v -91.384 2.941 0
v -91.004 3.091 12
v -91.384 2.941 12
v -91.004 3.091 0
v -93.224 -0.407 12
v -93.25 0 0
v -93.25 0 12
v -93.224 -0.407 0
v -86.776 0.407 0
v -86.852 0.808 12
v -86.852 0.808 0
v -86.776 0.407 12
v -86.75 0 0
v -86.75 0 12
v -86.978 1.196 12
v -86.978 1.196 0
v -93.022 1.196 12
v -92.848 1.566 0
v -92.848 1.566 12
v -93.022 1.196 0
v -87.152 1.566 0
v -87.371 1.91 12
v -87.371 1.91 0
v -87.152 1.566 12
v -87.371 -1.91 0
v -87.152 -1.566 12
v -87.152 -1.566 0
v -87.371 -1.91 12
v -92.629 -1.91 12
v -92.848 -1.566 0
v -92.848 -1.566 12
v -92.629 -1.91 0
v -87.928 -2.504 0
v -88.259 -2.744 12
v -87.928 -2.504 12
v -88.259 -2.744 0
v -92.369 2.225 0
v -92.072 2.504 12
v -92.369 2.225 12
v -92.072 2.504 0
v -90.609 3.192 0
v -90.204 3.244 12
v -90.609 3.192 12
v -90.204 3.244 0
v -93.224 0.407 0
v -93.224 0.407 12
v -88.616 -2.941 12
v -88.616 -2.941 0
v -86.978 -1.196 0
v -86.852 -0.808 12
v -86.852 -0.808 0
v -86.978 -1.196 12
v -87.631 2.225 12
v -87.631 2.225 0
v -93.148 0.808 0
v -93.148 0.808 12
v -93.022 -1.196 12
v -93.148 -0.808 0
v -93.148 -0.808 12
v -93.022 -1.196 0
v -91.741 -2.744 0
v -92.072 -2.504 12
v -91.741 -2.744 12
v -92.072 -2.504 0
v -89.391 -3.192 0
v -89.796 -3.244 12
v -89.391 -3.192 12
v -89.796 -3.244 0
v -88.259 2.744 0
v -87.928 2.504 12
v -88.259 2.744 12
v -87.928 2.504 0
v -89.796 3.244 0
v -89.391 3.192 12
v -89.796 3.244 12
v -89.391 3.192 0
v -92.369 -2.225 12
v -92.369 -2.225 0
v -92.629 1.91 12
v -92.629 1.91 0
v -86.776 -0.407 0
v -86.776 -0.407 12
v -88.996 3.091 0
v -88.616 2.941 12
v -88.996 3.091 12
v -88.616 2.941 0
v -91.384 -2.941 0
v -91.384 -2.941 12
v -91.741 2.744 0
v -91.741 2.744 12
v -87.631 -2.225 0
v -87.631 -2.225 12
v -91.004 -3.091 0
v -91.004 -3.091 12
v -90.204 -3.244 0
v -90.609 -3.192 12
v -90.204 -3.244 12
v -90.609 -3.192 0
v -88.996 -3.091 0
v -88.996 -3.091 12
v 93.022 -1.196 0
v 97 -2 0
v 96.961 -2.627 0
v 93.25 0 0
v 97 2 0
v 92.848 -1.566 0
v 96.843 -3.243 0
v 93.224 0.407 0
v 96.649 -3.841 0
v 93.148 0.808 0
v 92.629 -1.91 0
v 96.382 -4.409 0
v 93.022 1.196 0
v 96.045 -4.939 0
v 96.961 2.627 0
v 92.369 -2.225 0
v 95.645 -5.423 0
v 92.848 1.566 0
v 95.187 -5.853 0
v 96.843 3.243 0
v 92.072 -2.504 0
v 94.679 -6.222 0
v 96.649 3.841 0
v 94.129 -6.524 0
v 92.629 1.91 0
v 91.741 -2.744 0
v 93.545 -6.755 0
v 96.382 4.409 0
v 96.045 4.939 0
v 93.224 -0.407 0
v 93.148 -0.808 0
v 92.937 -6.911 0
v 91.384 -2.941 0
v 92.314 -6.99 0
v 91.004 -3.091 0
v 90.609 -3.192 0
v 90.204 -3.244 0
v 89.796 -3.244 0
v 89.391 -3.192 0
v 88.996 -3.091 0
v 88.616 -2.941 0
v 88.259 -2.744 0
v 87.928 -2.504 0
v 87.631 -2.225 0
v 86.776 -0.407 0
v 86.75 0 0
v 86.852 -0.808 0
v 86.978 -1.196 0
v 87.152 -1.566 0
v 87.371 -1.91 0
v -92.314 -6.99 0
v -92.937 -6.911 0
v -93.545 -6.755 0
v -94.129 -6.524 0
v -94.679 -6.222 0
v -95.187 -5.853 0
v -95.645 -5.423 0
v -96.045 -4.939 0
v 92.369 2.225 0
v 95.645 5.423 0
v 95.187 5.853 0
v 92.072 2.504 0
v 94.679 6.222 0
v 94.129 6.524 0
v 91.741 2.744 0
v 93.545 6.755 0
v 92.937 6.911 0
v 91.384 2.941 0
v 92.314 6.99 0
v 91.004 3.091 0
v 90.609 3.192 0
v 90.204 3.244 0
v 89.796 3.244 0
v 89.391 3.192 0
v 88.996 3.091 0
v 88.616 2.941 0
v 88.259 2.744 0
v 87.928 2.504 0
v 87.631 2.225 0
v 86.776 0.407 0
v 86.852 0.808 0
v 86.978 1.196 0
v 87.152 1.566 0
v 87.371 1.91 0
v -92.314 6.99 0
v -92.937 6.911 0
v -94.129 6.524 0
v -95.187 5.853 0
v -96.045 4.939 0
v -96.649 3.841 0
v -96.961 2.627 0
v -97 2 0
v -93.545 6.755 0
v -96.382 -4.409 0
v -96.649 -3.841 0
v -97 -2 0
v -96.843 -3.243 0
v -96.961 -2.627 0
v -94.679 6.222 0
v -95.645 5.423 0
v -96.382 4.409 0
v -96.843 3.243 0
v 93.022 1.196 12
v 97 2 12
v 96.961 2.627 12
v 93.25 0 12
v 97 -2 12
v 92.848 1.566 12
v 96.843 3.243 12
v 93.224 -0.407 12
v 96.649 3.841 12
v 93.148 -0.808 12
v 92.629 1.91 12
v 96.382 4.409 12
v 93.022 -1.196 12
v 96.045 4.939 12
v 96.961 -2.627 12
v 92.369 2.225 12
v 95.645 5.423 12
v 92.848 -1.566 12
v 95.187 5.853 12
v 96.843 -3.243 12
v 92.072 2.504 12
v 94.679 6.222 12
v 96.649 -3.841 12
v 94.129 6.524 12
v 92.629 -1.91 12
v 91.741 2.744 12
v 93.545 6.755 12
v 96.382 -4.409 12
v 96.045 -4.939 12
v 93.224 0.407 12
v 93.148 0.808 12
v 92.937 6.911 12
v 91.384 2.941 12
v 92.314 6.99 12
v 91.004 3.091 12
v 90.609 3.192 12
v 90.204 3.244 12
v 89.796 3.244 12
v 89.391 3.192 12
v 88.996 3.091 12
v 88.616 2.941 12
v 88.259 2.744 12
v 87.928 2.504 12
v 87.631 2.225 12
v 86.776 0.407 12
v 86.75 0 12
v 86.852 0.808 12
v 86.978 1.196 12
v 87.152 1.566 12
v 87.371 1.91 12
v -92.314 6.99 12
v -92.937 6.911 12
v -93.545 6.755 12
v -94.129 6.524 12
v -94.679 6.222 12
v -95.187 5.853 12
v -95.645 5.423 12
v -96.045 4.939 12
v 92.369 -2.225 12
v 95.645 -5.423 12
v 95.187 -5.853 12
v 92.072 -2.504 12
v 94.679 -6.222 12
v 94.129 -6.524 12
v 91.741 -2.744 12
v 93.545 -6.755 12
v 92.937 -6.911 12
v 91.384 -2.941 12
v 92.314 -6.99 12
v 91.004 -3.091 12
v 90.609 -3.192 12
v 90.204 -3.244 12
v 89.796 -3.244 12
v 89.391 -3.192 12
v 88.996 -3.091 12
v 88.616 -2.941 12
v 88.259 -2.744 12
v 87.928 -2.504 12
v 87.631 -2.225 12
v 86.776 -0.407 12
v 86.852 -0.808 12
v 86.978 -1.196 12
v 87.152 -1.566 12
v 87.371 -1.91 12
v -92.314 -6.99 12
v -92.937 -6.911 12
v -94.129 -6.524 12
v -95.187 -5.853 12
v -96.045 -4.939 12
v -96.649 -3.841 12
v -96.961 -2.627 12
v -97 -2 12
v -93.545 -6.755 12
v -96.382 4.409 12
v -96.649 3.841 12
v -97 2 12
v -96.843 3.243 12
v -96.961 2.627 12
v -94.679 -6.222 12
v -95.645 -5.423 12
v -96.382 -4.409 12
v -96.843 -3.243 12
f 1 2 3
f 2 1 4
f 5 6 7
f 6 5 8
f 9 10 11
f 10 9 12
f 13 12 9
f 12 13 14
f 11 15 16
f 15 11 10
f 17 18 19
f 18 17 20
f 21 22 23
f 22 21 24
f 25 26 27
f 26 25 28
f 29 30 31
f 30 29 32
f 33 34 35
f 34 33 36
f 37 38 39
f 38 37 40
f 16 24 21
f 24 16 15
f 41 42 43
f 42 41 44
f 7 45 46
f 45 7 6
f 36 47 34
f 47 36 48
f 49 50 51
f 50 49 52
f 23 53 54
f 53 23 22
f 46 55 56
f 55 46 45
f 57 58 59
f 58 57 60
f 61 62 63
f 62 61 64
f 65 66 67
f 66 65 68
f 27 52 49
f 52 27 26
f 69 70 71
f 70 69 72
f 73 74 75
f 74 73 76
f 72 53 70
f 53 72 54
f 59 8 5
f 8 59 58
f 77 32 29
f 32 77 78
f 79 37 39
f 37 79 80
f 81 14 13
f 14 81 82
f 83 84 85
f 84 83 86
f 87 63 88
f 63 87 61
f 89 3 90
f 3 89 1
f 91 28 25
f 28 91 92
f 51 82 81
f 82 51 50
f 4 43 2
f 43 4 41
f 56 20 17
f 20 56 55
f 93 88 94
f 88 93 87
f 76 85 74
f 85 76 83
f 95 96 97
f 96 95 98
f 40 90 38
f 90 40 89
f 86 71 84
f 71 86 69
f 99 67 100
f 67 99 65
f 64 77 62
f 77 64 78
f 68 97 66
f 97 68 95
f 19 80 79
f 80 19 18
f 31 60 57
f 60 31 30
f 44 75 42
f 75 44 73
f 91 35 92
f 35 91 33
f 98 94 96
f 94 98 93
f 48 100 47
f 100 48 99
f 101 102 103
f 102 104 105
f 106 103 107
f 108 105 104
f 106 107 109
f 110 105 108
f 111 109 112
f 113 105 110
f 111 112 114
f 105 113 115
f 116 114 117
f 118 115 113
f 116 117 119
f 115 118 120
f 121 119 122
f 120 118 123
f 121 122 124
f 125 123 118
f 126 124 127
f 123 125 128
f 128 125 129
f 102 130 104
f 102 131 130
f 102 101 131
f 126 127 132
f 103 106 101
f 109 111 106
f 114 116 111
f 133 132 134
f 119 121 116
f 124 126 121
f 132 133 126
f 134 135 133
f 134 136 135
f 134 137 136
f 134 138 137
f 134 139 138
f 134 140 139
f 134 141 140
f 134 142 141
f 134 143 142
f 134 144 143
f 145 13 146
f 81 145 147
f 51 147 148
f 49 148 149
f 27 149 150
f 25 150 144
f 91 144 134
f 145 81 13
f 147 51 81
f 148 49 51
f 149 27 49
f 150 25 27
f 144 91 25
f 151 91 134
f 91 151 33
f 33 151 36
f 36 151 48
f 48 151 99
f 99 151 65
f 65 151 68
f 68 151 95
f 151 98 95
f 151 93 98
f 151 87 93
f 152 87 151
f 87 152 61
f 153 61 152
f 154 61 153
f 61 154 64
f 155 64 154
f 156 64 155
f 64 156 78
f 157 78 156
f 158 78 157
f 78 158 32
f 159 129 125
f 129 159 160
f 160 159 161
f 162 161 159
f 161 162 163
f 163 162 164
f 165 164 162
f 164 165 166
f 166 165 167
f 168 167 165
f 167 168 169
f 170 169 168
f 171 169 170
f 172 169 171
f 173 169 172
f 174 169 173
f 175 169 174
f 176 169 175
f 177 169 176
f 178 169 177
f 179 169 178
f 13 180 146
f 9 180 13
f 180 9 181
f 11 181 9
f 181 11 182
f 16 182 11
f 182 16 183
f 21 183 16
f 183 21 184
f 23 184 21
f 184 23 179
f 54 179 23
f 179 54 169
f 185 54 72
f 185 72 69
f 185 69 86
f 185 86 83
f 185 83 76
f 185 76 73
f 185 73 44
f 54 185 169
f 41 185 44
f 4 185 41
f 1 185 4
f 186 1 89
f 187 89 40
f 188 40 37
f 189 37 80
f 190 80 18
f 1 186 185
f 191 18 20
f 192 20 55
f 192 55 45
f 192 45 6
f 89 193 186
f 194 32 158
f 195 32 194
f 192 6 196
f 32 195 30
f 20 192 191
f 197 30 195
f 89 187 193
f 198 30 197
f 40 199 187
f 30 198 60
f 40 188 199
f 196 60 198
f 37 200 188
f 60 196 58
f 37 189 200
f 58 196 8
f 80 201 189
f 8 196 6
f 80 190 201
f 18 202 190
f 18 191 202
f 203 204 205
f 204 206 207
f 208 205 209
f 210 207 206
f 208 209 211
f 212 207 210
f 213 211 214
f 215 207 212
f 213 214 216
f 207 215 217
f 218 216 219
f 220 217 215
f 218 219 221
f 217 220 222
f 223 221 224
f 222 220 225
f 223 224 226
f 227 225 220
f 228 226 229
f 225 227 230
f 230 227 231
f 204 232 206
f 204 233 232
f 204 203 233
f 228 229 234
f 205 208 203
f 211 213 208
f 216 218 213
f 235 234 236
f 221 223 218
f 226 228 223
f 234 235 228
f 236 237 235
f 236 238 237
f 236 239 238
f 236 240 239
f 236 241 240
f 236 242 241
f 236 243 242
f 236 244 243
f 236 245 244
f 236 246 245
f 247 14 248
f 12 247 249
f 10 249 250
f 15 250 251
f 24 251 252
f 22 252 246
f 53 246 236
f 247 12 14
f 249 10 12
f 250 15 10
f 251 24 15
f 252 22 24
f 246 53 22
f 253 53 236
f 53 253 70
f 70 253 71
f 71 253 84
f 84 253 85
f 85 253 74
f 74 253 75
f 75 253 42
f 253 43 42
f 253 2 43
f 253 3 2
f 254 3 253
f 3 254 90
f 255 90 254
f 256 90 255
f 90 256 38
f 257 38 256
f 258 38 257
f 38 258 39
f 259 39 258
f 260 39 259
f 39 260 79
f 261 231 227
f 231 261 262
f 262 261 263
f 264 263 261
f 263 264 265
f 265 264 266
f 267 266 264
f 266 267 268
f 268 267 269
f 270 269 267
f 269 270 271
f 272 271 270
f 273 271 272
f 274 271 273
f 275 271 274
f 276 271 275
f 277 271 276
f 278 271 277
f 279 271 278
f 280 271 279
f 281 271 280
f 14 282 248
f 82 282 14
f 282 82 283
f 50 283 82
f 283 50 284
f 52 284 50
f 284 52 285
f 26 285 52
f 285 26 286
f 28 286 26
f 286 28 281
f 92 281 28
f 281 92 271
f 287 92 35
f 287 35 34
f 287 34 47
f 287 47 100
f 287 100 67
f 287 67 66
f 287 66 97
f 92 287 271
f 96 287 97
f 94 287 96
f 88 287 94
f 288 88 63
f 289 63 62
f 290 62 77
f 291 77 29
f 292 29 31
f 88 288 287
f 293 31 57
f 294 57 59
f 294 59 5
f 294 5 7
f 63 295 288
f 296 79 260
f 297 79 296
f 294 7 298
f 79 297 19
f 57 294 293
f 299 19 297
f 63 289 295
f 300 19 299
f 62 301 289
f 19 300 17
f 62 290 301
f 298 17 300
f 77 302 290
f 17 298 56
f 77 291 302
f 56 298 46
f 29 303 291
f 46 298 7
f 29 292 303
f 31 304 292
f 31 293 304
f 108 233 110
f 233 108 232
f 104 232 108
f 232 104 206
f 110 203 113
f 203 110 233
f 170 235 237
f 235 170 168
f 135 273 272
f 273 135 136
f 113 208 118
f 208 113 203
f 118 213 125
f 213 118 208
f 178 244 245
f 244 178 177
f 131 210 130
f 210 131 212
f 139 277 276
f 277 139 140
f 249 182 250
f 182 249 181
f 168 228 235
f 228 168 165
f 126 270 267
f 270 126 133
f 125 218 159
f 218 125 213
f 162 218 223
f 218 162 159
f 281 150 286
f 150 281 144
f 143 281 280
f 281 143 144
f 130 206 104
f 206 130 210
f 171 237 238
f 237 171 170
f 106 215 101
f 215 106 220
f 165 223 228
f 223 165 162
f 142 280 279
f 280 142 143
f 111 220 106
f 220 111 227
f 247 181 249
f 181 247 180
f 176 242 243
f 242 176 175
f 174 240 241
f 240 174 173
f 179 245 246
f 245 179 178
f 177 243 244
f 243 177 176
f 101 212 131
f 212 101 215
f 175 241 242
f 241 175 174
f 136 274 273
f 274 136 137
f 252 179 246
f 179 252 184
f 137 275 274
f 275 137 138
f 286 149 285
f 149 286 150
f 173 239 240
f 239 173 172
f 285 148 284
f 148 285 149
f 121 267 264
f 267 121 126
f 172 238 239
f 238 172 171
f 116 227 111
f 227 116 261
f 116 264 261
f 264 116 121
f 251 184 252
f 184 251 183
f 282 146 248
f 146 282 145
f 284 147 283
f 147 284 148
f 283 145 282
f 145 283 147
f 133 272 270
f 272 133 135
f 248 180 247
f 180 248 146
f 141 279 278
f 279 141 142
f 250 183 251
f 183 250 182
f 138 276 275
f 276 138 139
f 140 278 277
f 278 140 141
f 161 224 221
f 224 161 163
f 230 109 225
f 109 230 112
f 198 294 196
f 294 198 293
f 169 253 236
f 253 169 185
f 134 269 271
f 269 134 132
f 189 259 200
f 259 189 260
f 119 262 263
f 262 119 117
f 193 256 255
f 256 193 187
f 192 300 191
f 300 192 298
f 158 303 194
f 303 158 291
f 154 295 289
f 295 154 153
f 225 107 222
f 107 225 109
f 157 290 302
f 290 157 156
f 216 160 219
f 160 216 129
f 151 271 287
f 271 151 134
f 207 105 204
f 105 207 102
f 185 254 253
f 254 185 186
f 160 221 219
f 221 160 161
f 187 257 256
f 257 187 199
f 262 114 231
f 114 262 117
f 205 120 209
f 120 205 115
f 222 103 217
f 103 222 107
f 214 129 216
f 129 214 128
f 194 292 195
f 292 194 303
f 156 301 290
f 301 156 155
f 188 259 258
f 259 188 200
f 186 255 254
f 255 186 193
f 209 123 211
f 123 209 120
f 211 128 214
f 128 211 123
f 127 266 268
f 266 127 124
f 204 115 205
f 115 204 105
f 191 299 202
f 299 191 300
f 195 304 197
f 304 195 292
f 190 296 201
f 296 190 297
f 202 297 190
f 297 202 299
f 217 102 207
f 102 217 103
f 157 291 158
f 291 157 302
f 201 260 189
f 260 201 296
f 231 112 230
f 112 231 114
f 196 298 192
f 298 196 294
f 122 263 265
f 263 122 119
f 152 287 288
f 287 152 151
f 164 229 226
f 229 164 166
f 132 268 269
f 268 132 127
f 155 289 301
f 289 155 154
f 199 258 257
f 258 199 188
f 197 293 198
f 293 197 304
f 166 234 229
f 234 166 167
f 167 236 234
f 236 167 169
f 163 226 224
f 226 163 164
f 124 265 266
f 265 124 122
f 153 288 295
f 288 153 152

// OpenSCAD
$fn = 50;


difference() {
	union() {
		hull() {
			translate(v = [-92.0000000000, 2.0000000000, 0]) {
				cylinder(h = 12, r = 5);
			}
			translate(v = [92.0000000000, 2.0000000000, 0]) {
				cylinder(h = 12, r = 5);
			}
			translate(v = [-92.0000000000, -2.0000000000, 0]) {
				cylinder(h = 12, r = 5);
			}
			translate(v = [92.0000000000, -2.0000000000, 0]) {
				cylinder(h = 12, r = 5);
			}
		}
	}
	union() {
		translate(v = [-90.0000000000, 0.0000000000, 0]) {
			cylinder(h = 12, r = 3.2500000000);
		}
		translate(v = [90.0000000000, 0.0000000000, 0]) {
			cylinder(h = 12, r = 3.2500000000);
		}
		translate(v = [-90.0000000000, 0.0000000000, 0]) {
			cylinder(h = 12, r = 1.8000000000);
		}
		translate(v = [90.0000000000, 0.0000000000, 0]) {
			cylinder(h = 12, r = 1.8000000000);
		}
		translate(v = [-90.0000000000, 0.0000000000, 0]) {
			cylinder(h = 12, r = 1.8000000000);
		}
		translate(v = [90.0000000000, 0.0000000000, 0]) {
			cylinder(h = 12, r = 1.8000000000);
		}
		translate(v = [-90.0000000000, 0.0000000000, 0]) {
			cylinder(h = 12, r = 1.8000000000);
		}
		translate(v = [90.0000000000, 0.0000000000, 0]) {
			cylinder(h = 12, r = 1.8000000000);
		}
	}
}
